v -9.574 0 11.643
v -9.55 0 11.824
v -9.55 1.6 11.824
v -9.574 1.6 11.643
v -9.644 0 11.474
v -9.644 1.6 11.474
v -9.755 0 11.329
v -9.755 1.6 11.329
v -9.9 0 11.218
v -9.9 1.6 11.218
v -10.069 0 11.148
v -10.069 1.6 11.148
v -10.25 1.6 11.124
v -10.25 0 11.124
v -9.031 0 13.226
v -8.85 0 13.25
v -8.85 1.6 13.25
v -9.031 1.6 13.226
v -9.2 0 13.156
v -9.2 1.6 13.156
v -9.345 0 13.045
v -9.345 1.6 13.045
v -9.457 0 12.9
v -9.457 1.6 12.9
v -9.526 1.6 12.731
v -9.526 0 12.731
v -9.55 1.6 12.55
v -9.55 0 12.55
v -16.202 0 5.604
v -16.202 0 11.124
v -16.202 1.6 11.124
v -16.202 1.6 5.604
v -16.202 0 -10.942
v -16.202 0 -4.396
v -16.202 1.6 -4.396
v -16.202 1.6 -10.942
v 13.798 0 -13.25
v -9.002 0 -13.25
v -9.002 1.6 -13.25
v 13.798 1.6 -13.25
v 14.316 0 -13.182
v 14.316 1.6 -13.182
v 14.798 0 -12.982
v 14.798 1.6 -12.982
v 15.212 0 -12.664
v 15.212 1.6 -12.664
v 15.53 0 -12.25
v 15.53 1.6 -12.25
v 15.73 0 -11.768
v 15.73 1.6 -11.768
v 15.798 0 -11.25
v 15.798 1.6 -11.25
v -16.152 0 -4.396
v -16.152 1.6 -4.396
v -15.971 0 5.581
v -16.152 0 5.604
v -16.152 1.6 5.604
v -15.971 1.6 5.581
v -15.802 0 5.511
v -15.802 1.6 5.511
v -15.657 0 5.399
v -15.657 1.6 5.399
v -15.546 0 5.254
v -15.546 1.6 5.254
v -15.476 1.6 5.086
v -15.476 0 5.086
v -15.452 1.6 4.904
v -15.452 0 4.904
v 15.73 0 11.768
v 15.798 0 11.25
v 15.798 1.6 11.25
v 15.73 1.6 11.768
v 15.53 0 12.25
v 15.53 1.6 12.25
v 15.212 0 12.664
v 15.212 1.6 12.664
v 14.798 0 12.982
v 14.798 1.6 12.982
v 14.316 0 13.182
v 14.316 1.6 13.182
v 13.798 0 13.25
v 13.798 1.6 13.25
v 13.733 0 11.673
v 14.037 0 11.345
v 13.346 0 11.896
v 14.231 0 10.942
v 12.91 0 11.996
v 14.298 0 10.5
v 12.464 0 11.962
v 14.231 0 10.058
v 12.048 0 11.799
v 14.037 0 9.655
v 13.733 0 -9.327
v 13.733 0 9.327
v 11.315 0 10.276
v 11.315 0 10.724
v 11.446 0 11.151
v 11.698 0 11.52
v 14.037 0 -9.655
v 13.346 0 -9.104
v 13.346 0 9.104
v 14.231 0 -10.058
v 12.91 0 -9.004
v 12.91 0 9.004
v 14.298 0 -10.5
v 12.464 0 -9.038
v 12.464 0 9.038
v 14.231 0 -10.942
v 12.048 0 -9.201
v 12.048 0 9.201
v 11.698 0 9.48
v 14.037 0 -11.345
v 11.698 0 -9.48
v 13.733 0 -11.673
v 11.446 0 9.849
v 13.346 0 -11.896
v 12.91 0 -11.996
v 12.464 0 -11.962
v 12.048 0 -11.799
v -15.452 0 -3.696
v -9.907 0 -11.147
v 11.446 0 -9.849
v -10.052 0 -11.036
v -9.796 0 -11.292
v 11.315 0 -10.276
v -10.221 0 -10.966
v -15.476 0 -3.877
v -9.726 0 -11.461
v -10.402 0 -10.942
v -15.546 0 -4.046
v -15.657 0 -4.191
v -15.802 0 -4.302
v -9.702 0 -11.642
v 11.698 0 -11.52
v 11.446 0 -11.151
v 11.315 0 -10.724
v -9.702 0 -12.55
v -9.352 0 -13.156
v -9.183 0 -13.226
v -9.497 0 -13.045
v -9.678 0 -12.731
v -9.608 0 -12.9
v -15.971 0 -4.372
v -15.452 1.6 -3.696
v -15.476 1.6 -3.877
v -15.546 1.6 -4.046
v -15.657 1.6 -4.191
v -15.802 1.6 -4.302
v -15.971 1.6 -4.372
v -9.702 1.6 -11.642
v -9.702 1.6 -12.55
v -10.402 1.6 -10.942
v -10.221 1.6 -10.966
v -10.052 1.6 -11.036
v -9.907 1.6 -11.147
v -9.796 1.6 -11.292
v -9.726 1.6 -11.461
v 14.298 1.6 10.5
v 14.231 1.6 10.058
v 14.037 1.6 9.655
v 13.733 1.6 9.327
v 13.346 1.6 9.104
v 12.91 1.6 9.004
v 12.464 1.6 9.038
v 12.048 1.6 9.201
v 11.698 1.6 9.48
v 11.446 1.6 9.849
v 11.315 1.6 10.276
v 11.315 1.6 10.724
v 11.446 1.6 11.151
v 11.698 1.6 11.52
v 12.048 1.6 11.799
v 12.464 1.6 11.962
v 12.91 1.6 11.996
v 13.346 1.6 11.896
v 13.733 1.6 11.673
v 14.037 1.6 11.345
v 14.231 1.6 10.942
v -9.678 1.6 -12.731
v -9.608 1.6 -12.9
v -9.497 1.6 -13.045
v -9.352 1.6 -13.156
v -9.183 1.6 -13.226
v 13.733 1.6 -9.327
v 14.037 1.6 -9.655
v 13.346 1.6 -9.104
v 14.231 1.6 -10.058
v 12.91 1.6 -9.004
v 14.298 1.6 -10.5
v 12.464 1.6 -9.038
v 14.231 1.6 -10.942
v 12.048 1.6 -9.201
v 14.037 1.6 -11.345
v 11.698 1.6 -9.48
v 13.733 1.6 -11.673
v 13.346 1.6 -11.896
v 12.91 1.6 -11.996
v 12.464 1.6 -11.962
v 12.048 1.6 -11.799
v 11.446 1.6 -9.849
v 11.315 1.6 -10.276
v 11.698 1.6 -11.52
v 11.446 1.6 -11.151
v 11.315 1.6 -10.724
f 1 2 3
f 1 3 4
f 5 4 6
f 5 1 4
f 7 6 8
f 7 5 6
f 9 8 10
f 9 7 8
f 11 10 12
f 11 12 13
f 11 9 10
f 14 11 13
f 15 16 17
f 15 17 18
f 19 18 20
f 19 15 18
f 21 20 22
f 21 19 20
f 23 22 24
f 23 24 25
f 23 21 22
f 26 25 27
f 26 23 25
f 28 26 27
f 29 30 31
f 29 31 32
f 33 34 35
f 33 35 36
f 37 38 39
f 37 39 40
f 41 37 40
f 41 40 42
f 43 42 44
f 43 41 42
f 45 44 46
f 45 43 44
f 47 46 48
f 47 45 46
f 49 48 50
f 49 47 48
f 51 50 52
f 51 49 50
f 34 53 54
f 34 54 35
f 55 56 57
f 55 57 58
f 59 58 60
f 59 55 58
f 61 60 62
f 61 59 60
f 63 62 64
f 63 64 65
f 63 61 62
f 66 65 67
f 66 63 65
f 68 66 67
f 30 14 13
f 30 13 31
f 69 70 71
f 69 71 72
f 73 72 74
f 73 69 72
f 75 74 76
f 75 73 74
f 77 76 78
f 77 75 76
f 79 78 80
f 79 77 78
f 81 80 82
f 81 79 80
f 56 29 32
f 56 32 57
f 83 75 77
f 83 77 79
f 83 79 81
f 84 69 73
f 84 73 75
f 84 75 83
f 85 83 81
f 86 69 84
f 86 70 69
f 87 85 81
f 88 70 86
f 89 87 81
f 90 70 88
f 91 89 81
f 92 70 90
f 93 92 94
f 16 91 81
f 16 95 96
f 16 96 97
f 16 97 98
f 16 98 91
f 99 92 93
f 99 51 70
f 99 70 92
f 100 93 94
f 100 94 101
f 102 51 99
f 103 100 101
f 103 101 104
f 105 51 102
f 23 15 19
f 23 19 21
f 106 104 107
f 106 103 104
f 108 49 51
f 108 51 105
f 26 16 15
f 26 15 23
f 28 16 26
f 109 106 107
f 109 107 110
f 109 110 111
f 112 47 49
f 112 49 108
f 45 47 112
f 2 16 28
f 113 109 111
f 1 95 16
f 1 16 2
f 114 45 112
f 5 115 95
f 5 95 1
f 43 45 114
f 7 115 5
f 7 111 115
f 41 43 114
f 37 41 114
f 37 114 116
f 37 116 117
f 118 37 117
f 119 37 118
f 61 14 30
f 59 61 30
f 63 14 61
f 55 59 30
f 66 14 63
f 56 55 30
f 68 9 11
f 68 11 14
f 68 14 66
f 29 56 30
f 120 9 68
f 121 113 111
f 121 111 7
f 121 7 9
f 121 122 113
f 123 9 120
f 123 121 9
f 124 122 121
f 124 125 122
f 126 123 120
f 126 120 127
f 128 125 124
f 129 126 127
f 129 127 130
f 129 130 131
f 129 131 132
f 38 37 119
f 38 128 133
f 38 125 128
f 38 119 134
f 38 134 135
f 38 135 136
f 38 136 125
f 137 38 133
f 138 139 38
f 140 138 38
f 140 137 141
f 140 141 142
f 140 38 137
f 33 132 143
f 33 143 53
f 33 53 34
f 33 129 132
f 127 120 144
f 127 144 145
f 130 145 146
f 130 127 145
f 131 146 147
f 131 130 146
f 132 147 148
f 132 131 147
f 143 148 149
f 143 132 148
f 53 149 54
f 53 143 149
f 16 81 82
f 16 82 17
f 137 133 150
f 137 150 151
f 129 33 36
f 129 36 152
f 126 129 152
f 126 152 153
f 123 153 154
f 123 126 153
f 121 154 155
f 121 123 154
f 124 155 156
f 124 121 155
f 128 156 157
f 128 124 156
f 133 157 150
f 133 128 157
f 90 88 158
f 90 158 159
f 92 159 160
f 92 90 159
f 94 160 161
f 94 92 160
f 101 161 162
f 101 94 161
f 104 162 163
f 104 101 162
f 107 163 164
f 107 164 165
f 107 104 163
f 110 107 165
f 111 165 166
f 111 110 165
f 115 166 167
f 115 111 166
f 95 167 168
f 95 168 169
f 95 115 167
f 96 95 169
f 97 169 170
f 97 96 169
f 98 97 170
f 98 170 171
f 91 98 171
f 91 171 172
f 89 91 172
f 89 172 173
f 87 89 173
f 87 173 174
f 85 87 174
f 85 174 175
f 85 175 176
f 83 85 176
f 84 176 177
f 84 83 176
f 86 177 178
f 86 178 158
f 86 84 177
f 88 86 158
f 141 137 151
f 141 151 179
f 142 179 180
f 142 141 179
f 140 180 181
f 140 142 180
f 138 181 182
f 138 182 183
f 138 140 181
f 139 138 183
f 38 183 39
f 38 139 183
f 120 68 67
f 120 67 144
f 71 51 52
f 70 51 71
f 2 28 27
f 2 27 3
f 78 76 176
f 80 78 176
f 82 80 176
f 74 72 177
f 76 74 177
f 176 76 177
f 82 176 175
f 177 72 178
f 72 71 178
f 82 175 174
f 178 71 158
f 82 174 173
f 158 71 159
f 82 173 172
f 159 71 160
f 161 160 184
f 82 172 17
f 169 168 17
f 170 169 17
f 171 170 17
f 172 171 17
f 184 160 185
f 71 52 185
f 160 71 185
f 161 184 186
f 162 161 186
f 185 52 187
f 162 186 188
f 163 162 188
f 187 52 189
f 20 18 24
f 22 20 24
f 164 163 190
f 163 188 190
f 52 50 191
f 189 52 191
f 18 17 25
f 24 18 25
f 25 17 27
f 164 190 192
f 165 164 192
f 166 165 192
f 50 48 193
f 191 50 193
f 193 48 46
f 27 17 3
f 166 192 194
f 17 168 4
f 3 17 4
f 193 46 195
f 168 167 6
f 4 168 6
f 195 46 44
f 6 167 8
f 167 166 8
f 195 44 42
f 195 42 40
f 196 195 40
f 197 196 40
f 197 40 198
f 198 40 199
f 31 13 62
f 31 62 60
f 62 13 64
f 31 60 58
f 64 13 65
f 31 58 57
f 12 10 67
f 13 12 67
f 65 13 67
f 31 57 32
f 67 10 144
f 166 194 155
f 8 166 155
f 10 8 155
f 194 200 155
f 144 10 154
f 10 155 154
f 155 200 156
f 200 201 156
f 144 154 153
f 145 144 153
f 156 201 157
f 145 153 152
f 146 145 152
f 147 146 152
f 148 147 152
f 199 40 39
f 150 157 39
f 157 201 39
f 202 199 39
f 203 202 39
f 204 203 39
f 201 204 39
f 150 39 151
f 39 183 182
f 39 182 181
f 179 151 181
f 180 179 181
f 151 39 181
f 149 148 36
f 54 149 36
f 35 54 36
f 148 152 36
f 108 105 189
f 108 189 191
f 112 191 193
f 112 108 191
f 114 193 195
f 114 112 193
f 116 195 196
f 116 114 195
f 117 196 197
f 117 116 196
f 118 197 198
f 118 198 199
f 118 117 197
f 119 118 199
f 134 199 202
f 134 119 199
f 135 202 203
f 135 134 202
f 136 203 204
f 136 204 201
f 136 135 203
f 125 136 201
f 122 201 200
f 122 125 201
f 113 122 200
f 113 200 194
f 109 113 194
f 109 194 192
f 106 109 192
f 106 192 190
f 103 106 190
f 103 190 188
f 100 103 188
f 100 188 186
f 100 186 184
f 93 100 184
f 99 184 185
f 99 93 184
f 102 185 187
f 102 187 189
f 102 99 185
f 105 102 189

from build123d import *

# Parameters (mm, degrees)
SKETCH1_R           = 1.5
BOSS_EXTRUDE1_DEPTH = 1.6


with BuildPart() as part:
    # Sketch1 → Boss-Extrude1 (new body)
    with BuildSketch(Plane(origin=(0, 0, 0), x_dir=(1, 0, 0), z_dir=(0, 1, 0))):
        with BuildLine():
            Line((-9.702113495, 11.642067097), (-9.702113495, 12.55))
            ThreePointArc((-9.702113495, 12.55), (-9.497088242, 13.044974747), (-9.002113495, 13.25))
            Line((-9.002113495, 13.25), (13.797886505, 13.25))
            ThreePointArc((13.797886505, 13.25), (15.212100067, 12.664213562), (15.797886505, 11.25))
            Line((15.797886505, 11.25), (15.797886505, -11.25))
            ThreePointArc((15.797886505, -11.25), (15.212100067, -12.664213562), (13.797886505, -13.25))
            Line((13.797886505, -13.25), (-8.850291446, -13.25))
            ThreePointArc((-8.850291446, -13.25), (-9.345266193, -13.044974747), (-9.550291446, -12.55))
            Line((-9.550291446, -12.55), (-9.550291446, -11.824237104))
            ThreePointArc((-9.550291446, -11.824237104), (-9.7553167, -11.329262357), (-10.250291446, -11.124237104))
            Line((-10.250291446, -11.124237104), (-16.202113495, -11.124237104))
            Line((-16.202113495, -11.124237104), (-16.202113495, -5.604412091))
            Line((-16.202113495, -5.604412091), (-16.152113495, -5.604412091))
            ThreePointArc((-16.152113495, -5.604412091), (-15.657138749, -5.399386838), (-15.452113495, -4.904412091))
            Line((-15.452113495, -4.904412091), (-15.452113495, 3.695587909))
            ThreePointArc((-15.452113495, 3.695587909), (-15.657138749, 4.190562656), (-16.152113495, 4.395587909))
            Line((-16.152113495, 4.395587909), (-16.202113495, 4.395587909))
            Line((-16.202113495, 4.395587909), (-16.202113495, 10.942067097))
            Line((-16.202113495, 10.942067097), (-10.402113495, 10.942067097))
            ThreePointArc((-10.402113495, 10.942067097), (-9.907138749, 11.14709235), (-9.702113495, 11.642067097))
        make_face()
        with Locations((12.797886505, 10.5)):
            Circle(SKETCH1_R, mode=Mode.SUBTRACT)
        with Locations((12.797886505, -10.5)):
            Circle(SKETCH1_R, mode=Mode.SUBTRACT)
    extrude(amount=BOSS_EXTRUDE1_DEPTH)


solid = part.part
